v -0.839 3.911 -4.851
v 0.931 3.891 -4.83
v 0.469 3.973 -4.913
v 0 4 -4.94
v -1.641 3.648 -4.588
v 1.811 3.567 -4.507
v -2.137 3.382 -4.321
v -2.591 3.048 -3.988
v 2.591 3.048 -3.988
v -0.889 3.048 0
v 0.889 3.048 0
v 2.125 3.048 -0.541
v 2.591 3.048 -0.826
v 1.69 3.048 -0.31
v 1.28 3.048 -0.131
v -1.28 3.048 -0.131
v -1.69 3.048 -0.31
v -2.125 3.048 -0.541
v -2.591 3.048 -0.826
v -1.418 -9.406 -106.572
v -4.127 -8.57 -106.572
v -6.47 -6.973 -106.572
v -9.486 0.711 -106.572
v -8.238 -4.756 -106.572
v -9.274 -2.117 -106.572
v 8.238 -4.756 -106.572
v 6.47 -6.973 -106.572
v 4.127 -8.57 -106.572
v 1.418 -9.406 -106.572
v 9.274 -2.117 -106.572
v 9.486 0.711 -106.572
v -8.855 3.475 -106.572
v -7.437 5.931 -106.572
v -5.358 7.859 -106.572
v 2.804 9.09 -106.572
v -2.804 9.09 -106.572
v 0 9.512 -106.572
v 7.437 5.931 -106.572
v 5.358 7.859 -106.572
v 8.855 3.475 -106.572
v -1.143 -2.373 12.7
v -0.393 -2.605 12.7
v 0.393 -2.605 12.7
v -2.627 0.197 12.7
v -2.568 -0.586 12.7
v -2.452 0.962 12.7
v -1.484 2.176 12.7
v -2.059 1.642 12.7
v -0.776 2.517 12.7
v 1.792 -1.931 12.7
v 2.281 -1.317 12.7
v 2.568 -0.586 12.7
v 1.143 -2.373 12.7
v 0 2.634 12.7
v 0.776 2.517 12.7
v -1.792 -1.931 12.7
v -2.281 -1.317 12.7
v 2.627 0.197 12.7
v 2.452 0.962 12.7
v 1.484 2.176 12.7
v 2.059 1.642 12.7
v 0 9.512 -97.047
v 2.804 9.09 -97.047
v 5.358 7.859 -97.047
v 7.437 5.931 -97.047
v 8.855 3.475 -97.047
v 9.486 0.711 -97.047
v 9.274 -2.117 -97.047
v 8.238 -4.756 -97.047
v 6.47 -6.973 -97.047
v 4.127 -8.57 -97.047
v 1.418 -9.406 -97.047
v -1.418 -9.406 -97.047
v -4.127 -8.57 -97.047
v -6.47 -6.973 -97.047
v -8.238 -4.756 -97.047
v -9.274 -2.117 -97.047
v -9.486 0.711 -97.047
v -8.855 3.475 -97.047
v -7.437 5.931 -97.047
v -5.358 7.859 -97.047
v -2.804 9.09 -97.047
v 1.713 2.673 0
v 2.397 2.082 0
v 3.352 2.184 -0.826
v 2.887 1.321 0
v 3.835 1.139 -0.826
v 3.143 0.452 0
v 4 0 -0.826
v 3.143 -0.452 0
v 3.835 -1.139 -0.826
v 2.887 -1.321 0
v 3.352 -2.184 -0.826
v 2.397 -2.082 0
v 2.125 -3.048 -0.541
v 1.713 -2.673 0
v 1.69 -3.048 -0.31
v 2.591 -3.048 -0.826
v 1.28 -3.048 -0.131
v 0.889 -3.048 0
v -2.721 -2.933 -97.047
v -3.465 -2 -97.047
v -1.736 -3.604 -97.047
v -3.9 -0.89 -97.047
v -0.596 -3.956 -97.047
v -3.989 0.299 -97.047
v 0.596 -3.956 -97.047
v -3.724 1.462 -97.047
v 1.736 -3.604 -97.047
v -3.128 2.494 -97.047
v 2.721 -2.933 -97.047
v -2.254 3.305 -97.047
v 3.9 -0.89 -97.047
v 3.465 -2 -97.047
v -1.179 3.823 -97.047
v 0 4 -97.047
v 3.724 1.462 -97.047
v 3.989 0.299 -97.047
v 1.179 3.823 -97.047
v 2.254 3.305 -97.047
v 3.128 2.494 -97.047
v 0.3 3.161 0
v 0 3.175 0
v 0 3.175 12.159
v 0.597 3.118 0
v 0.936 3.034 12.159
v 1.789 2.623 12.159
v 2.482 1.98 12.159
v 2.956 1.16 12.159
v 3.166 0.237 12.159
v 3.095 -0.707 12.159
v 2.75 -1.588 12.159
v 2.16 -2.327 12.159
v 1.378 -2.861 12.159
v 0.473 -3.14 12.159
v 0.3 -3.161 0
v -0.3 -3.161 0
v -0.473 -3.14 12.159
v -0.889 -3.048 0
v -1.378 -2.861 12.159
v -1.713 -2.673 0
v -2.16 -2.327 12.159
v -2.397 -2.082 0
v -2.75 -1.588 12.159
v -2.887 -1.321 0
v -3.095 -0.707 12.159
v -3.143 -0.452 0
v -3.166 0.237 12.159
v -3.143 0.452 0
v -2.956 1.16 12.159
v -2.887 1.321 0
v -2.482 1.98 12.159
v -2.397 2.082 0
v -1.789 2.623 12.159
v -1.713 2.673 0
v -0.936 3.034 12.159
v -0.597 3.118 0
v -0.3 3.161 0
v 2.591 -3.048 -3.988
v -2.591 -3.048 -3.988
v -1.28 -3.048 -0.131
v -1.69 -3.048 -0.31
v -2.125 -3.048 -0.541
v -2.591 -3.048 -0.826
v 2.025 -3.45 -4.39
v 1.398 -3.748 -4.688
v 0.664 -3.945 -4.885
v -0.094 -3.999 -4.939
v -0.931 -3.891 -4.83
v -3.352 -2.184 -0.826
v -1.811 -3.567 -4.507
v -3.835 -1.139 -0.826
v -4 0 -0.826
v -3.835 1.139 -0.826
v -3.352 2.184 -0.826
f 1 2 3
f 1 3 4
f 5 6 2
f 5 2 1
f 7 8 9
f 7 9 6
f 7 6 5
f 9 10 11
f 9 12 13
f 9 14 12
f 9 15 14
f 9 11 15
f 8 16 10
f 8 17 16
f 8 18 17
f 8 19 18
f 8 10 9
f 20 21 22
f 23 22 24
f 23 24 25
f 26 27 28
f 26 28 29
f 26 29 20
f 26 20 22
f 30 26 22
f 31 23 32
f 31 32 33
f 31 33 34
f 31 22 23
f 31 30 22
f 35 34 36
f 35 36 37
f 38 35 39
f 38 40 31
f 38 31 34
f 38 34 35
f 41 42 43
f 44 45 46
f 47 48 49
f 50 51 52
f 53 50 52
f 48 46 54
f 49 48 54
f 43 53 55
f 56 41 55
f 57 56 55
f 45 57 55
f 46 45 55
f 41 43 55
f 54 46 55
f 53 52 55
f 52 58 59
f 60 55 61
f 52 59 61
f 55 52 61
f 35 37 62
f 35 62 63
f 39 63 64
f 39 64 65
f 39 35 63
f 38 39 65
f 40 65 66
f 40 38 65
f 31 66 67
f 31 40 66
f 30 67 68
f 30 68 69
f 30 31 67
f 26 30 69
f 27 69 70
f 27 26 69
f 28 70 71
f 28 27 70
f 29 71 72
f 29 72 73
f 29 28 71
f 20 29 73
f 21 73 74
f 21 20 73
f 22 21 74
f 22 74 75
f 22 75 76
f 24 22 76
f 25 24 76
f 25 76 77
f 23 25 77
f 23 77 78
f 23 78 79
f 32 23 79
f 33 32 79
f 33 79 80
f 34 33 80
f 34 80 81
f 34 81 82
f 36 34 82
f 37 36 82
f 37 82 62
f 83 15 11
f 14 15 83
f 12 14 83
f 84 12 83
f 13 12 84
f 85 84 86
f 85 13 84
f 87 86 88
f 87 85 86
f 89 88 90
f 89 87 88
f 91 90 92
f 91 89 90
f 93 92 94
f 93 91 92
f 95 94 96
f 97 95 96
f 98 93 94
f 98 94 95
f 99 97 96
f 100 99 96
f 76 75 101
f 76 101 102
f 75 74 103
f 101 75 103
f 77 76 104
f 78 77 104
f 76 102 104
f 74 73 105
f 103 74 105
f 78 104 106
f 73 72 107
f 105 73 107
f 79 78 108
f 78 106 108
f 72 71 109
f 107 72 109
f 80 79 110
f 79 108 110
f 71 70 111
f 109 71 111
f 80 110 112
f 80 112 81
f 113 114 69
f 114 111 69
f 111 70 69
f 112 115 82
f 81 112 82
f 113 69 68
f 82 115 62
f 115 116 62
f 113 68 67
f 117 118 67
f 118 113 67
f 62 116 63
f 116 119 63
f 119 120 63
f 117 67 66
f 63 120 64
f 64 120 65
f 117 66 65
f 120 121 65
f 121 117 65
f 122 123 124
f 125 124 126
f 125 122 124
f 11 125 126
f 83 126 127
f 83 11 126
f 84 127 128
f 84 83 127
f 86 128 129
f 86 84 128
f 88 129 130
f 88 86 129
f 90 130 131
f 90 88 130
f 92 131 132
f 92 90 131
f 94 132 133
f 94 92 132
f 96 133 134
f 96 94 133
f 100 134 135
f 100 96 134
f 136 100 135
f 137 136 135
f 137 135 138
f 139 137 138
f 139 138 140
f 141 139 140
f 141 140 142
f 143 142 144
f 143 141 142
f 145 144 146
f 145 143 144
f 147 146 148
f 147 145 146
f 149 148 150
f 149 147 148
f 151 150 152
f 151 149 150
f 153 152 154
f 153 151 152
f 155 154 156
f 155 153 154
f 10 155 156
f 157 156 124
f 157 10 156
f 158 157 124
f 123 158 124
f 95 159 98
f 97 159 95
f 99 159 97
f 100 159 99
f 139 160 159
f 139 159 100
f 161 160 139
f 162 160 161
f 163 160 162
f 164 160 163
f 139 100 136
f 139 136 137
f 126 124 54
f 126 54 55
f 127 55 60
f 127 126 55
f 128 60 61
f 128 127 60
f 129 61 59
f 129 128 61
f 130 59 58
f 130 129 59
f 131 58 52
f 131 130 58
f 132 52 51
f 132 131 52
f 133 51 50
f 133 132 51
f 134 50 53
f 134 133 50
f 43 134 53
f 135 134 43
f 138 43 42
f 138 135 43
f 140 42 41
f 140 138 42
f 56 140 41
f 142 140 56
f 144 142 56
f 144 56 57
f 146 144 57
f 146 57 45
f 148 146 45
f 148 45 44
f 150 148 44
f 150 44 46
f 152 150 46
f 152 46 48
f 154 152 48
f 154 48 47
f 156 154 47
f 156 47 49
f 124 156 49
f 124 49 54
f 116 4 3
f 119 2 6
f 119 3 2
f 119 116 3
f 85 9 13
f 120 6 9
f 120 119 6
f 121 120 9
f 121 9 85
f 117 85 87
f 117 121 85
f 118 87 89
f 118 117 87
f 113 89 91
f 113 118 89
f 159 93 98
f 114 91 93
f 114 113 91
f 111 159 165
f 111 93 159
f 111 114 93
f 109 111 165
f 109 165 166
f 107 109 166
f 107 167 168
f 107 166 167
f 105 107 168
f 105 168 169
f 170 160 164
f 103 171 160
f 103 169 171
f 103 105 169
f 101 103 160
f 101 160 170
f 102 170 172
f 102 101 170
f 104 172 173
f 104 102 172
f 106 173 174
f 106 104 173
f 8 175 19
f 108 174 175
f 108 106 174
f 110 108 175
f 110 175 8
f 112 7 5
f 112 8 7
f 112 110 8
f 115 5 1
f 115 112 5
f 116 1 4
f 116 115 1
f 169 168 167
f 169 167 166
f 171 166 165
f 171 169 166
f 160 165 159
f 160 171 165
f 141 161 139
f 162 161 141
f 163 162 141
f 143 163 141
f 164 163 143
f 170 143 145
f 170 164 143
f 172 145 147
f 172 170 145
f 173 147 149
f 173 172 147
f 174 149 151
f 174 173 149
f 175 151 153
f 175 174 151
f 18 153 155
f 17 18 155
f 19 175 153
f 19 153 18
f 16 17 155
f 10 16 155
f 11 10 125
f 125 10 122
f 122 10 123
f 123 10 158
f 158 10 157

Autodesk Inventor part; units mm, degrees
sketch "Sketch_1" plane through (0, 0, 0) normal (1, 0, 0) x (0, 1, 0)
  line L0 (0, -106.5721) -> (0, 12.7)
  line L1 (0, 12.7) -> (2.634, 12.7)
  line L2 (2.634, 12.7) -> (3.175, 12.159)
  line L3 (3.175, 12.159) -> (3.175, 0)
  line L4 (3.175, 0) -> (4.0005, -0.8255)
  line L5 (4.0005, -0.8255) -> (4.0005, -97.0471)
  line L6 (4.0005, -97.0471) -> (9.5123, -97.0471)
  line L7 (9.5123, -97.0471) -> (9.5123, -106.5721)
  line L8 (9.5123, -106.5721) -> (0, -106.5721)
  line L9 (0, -106.5721) -> (0, 12.7)
revolve "Revolution1" add sketch "Sketch_1" angle 360 about axis through (0, 0, -106.5721) along (0, 0, -1)
thread "Thread1" size "1/4-28 UNF" class "2A" standard "ANSI Unified Screw Threads" full length
sketch "Sketch_2" plane through (0, 0, 0) normal (1, 0, 0) x (0, 1, 0)
  line L0 (6.096, 0) -> (3.048, 0)
  line L1 (3.048, 0) -> (3.048, -3.9878)
  line L2 (3.048, -3.9878) -> (6.096, -7.0358)
  line L3 (6.096, -7.0358) -> (6.096, 0)
extrude "Extrusion1" cut sketch "Sketch_2" along normal mid plane 16.002
sketch "Sketch_3" plane through (0, 0, 0) normal (1, 0, 0) x (0, 1, 0)
  line L0 (-6.096, 0) -> (-6.096, -7.0358)
  line L1 (-6.096, -7.0358) -> (-3.048, -3.9878)
  line L2 (-3.048, -3.9878) -> (-3.048, 0)
  line L3 (-3.048, 0) -> (-6.096, 0)
extrude "Extrusion2" cut sketch "Sketch_3" along normal mid plane 16.002
ref_plane "conn_XY" through (0, 0, 0) normal (0, 0, -1) x (1, 0, 0)
ref_plane "conn_YZ" through (0, 0, 0) normal (1, 0, 0) x (0, -1, 0)
ref_plane "conn_ZX" through (0, 0, 0) normal (0, -1, 0) x (0, 0, -1)
properties part number "PR_OCG1-3/4x2" material "Stainless Steel"
